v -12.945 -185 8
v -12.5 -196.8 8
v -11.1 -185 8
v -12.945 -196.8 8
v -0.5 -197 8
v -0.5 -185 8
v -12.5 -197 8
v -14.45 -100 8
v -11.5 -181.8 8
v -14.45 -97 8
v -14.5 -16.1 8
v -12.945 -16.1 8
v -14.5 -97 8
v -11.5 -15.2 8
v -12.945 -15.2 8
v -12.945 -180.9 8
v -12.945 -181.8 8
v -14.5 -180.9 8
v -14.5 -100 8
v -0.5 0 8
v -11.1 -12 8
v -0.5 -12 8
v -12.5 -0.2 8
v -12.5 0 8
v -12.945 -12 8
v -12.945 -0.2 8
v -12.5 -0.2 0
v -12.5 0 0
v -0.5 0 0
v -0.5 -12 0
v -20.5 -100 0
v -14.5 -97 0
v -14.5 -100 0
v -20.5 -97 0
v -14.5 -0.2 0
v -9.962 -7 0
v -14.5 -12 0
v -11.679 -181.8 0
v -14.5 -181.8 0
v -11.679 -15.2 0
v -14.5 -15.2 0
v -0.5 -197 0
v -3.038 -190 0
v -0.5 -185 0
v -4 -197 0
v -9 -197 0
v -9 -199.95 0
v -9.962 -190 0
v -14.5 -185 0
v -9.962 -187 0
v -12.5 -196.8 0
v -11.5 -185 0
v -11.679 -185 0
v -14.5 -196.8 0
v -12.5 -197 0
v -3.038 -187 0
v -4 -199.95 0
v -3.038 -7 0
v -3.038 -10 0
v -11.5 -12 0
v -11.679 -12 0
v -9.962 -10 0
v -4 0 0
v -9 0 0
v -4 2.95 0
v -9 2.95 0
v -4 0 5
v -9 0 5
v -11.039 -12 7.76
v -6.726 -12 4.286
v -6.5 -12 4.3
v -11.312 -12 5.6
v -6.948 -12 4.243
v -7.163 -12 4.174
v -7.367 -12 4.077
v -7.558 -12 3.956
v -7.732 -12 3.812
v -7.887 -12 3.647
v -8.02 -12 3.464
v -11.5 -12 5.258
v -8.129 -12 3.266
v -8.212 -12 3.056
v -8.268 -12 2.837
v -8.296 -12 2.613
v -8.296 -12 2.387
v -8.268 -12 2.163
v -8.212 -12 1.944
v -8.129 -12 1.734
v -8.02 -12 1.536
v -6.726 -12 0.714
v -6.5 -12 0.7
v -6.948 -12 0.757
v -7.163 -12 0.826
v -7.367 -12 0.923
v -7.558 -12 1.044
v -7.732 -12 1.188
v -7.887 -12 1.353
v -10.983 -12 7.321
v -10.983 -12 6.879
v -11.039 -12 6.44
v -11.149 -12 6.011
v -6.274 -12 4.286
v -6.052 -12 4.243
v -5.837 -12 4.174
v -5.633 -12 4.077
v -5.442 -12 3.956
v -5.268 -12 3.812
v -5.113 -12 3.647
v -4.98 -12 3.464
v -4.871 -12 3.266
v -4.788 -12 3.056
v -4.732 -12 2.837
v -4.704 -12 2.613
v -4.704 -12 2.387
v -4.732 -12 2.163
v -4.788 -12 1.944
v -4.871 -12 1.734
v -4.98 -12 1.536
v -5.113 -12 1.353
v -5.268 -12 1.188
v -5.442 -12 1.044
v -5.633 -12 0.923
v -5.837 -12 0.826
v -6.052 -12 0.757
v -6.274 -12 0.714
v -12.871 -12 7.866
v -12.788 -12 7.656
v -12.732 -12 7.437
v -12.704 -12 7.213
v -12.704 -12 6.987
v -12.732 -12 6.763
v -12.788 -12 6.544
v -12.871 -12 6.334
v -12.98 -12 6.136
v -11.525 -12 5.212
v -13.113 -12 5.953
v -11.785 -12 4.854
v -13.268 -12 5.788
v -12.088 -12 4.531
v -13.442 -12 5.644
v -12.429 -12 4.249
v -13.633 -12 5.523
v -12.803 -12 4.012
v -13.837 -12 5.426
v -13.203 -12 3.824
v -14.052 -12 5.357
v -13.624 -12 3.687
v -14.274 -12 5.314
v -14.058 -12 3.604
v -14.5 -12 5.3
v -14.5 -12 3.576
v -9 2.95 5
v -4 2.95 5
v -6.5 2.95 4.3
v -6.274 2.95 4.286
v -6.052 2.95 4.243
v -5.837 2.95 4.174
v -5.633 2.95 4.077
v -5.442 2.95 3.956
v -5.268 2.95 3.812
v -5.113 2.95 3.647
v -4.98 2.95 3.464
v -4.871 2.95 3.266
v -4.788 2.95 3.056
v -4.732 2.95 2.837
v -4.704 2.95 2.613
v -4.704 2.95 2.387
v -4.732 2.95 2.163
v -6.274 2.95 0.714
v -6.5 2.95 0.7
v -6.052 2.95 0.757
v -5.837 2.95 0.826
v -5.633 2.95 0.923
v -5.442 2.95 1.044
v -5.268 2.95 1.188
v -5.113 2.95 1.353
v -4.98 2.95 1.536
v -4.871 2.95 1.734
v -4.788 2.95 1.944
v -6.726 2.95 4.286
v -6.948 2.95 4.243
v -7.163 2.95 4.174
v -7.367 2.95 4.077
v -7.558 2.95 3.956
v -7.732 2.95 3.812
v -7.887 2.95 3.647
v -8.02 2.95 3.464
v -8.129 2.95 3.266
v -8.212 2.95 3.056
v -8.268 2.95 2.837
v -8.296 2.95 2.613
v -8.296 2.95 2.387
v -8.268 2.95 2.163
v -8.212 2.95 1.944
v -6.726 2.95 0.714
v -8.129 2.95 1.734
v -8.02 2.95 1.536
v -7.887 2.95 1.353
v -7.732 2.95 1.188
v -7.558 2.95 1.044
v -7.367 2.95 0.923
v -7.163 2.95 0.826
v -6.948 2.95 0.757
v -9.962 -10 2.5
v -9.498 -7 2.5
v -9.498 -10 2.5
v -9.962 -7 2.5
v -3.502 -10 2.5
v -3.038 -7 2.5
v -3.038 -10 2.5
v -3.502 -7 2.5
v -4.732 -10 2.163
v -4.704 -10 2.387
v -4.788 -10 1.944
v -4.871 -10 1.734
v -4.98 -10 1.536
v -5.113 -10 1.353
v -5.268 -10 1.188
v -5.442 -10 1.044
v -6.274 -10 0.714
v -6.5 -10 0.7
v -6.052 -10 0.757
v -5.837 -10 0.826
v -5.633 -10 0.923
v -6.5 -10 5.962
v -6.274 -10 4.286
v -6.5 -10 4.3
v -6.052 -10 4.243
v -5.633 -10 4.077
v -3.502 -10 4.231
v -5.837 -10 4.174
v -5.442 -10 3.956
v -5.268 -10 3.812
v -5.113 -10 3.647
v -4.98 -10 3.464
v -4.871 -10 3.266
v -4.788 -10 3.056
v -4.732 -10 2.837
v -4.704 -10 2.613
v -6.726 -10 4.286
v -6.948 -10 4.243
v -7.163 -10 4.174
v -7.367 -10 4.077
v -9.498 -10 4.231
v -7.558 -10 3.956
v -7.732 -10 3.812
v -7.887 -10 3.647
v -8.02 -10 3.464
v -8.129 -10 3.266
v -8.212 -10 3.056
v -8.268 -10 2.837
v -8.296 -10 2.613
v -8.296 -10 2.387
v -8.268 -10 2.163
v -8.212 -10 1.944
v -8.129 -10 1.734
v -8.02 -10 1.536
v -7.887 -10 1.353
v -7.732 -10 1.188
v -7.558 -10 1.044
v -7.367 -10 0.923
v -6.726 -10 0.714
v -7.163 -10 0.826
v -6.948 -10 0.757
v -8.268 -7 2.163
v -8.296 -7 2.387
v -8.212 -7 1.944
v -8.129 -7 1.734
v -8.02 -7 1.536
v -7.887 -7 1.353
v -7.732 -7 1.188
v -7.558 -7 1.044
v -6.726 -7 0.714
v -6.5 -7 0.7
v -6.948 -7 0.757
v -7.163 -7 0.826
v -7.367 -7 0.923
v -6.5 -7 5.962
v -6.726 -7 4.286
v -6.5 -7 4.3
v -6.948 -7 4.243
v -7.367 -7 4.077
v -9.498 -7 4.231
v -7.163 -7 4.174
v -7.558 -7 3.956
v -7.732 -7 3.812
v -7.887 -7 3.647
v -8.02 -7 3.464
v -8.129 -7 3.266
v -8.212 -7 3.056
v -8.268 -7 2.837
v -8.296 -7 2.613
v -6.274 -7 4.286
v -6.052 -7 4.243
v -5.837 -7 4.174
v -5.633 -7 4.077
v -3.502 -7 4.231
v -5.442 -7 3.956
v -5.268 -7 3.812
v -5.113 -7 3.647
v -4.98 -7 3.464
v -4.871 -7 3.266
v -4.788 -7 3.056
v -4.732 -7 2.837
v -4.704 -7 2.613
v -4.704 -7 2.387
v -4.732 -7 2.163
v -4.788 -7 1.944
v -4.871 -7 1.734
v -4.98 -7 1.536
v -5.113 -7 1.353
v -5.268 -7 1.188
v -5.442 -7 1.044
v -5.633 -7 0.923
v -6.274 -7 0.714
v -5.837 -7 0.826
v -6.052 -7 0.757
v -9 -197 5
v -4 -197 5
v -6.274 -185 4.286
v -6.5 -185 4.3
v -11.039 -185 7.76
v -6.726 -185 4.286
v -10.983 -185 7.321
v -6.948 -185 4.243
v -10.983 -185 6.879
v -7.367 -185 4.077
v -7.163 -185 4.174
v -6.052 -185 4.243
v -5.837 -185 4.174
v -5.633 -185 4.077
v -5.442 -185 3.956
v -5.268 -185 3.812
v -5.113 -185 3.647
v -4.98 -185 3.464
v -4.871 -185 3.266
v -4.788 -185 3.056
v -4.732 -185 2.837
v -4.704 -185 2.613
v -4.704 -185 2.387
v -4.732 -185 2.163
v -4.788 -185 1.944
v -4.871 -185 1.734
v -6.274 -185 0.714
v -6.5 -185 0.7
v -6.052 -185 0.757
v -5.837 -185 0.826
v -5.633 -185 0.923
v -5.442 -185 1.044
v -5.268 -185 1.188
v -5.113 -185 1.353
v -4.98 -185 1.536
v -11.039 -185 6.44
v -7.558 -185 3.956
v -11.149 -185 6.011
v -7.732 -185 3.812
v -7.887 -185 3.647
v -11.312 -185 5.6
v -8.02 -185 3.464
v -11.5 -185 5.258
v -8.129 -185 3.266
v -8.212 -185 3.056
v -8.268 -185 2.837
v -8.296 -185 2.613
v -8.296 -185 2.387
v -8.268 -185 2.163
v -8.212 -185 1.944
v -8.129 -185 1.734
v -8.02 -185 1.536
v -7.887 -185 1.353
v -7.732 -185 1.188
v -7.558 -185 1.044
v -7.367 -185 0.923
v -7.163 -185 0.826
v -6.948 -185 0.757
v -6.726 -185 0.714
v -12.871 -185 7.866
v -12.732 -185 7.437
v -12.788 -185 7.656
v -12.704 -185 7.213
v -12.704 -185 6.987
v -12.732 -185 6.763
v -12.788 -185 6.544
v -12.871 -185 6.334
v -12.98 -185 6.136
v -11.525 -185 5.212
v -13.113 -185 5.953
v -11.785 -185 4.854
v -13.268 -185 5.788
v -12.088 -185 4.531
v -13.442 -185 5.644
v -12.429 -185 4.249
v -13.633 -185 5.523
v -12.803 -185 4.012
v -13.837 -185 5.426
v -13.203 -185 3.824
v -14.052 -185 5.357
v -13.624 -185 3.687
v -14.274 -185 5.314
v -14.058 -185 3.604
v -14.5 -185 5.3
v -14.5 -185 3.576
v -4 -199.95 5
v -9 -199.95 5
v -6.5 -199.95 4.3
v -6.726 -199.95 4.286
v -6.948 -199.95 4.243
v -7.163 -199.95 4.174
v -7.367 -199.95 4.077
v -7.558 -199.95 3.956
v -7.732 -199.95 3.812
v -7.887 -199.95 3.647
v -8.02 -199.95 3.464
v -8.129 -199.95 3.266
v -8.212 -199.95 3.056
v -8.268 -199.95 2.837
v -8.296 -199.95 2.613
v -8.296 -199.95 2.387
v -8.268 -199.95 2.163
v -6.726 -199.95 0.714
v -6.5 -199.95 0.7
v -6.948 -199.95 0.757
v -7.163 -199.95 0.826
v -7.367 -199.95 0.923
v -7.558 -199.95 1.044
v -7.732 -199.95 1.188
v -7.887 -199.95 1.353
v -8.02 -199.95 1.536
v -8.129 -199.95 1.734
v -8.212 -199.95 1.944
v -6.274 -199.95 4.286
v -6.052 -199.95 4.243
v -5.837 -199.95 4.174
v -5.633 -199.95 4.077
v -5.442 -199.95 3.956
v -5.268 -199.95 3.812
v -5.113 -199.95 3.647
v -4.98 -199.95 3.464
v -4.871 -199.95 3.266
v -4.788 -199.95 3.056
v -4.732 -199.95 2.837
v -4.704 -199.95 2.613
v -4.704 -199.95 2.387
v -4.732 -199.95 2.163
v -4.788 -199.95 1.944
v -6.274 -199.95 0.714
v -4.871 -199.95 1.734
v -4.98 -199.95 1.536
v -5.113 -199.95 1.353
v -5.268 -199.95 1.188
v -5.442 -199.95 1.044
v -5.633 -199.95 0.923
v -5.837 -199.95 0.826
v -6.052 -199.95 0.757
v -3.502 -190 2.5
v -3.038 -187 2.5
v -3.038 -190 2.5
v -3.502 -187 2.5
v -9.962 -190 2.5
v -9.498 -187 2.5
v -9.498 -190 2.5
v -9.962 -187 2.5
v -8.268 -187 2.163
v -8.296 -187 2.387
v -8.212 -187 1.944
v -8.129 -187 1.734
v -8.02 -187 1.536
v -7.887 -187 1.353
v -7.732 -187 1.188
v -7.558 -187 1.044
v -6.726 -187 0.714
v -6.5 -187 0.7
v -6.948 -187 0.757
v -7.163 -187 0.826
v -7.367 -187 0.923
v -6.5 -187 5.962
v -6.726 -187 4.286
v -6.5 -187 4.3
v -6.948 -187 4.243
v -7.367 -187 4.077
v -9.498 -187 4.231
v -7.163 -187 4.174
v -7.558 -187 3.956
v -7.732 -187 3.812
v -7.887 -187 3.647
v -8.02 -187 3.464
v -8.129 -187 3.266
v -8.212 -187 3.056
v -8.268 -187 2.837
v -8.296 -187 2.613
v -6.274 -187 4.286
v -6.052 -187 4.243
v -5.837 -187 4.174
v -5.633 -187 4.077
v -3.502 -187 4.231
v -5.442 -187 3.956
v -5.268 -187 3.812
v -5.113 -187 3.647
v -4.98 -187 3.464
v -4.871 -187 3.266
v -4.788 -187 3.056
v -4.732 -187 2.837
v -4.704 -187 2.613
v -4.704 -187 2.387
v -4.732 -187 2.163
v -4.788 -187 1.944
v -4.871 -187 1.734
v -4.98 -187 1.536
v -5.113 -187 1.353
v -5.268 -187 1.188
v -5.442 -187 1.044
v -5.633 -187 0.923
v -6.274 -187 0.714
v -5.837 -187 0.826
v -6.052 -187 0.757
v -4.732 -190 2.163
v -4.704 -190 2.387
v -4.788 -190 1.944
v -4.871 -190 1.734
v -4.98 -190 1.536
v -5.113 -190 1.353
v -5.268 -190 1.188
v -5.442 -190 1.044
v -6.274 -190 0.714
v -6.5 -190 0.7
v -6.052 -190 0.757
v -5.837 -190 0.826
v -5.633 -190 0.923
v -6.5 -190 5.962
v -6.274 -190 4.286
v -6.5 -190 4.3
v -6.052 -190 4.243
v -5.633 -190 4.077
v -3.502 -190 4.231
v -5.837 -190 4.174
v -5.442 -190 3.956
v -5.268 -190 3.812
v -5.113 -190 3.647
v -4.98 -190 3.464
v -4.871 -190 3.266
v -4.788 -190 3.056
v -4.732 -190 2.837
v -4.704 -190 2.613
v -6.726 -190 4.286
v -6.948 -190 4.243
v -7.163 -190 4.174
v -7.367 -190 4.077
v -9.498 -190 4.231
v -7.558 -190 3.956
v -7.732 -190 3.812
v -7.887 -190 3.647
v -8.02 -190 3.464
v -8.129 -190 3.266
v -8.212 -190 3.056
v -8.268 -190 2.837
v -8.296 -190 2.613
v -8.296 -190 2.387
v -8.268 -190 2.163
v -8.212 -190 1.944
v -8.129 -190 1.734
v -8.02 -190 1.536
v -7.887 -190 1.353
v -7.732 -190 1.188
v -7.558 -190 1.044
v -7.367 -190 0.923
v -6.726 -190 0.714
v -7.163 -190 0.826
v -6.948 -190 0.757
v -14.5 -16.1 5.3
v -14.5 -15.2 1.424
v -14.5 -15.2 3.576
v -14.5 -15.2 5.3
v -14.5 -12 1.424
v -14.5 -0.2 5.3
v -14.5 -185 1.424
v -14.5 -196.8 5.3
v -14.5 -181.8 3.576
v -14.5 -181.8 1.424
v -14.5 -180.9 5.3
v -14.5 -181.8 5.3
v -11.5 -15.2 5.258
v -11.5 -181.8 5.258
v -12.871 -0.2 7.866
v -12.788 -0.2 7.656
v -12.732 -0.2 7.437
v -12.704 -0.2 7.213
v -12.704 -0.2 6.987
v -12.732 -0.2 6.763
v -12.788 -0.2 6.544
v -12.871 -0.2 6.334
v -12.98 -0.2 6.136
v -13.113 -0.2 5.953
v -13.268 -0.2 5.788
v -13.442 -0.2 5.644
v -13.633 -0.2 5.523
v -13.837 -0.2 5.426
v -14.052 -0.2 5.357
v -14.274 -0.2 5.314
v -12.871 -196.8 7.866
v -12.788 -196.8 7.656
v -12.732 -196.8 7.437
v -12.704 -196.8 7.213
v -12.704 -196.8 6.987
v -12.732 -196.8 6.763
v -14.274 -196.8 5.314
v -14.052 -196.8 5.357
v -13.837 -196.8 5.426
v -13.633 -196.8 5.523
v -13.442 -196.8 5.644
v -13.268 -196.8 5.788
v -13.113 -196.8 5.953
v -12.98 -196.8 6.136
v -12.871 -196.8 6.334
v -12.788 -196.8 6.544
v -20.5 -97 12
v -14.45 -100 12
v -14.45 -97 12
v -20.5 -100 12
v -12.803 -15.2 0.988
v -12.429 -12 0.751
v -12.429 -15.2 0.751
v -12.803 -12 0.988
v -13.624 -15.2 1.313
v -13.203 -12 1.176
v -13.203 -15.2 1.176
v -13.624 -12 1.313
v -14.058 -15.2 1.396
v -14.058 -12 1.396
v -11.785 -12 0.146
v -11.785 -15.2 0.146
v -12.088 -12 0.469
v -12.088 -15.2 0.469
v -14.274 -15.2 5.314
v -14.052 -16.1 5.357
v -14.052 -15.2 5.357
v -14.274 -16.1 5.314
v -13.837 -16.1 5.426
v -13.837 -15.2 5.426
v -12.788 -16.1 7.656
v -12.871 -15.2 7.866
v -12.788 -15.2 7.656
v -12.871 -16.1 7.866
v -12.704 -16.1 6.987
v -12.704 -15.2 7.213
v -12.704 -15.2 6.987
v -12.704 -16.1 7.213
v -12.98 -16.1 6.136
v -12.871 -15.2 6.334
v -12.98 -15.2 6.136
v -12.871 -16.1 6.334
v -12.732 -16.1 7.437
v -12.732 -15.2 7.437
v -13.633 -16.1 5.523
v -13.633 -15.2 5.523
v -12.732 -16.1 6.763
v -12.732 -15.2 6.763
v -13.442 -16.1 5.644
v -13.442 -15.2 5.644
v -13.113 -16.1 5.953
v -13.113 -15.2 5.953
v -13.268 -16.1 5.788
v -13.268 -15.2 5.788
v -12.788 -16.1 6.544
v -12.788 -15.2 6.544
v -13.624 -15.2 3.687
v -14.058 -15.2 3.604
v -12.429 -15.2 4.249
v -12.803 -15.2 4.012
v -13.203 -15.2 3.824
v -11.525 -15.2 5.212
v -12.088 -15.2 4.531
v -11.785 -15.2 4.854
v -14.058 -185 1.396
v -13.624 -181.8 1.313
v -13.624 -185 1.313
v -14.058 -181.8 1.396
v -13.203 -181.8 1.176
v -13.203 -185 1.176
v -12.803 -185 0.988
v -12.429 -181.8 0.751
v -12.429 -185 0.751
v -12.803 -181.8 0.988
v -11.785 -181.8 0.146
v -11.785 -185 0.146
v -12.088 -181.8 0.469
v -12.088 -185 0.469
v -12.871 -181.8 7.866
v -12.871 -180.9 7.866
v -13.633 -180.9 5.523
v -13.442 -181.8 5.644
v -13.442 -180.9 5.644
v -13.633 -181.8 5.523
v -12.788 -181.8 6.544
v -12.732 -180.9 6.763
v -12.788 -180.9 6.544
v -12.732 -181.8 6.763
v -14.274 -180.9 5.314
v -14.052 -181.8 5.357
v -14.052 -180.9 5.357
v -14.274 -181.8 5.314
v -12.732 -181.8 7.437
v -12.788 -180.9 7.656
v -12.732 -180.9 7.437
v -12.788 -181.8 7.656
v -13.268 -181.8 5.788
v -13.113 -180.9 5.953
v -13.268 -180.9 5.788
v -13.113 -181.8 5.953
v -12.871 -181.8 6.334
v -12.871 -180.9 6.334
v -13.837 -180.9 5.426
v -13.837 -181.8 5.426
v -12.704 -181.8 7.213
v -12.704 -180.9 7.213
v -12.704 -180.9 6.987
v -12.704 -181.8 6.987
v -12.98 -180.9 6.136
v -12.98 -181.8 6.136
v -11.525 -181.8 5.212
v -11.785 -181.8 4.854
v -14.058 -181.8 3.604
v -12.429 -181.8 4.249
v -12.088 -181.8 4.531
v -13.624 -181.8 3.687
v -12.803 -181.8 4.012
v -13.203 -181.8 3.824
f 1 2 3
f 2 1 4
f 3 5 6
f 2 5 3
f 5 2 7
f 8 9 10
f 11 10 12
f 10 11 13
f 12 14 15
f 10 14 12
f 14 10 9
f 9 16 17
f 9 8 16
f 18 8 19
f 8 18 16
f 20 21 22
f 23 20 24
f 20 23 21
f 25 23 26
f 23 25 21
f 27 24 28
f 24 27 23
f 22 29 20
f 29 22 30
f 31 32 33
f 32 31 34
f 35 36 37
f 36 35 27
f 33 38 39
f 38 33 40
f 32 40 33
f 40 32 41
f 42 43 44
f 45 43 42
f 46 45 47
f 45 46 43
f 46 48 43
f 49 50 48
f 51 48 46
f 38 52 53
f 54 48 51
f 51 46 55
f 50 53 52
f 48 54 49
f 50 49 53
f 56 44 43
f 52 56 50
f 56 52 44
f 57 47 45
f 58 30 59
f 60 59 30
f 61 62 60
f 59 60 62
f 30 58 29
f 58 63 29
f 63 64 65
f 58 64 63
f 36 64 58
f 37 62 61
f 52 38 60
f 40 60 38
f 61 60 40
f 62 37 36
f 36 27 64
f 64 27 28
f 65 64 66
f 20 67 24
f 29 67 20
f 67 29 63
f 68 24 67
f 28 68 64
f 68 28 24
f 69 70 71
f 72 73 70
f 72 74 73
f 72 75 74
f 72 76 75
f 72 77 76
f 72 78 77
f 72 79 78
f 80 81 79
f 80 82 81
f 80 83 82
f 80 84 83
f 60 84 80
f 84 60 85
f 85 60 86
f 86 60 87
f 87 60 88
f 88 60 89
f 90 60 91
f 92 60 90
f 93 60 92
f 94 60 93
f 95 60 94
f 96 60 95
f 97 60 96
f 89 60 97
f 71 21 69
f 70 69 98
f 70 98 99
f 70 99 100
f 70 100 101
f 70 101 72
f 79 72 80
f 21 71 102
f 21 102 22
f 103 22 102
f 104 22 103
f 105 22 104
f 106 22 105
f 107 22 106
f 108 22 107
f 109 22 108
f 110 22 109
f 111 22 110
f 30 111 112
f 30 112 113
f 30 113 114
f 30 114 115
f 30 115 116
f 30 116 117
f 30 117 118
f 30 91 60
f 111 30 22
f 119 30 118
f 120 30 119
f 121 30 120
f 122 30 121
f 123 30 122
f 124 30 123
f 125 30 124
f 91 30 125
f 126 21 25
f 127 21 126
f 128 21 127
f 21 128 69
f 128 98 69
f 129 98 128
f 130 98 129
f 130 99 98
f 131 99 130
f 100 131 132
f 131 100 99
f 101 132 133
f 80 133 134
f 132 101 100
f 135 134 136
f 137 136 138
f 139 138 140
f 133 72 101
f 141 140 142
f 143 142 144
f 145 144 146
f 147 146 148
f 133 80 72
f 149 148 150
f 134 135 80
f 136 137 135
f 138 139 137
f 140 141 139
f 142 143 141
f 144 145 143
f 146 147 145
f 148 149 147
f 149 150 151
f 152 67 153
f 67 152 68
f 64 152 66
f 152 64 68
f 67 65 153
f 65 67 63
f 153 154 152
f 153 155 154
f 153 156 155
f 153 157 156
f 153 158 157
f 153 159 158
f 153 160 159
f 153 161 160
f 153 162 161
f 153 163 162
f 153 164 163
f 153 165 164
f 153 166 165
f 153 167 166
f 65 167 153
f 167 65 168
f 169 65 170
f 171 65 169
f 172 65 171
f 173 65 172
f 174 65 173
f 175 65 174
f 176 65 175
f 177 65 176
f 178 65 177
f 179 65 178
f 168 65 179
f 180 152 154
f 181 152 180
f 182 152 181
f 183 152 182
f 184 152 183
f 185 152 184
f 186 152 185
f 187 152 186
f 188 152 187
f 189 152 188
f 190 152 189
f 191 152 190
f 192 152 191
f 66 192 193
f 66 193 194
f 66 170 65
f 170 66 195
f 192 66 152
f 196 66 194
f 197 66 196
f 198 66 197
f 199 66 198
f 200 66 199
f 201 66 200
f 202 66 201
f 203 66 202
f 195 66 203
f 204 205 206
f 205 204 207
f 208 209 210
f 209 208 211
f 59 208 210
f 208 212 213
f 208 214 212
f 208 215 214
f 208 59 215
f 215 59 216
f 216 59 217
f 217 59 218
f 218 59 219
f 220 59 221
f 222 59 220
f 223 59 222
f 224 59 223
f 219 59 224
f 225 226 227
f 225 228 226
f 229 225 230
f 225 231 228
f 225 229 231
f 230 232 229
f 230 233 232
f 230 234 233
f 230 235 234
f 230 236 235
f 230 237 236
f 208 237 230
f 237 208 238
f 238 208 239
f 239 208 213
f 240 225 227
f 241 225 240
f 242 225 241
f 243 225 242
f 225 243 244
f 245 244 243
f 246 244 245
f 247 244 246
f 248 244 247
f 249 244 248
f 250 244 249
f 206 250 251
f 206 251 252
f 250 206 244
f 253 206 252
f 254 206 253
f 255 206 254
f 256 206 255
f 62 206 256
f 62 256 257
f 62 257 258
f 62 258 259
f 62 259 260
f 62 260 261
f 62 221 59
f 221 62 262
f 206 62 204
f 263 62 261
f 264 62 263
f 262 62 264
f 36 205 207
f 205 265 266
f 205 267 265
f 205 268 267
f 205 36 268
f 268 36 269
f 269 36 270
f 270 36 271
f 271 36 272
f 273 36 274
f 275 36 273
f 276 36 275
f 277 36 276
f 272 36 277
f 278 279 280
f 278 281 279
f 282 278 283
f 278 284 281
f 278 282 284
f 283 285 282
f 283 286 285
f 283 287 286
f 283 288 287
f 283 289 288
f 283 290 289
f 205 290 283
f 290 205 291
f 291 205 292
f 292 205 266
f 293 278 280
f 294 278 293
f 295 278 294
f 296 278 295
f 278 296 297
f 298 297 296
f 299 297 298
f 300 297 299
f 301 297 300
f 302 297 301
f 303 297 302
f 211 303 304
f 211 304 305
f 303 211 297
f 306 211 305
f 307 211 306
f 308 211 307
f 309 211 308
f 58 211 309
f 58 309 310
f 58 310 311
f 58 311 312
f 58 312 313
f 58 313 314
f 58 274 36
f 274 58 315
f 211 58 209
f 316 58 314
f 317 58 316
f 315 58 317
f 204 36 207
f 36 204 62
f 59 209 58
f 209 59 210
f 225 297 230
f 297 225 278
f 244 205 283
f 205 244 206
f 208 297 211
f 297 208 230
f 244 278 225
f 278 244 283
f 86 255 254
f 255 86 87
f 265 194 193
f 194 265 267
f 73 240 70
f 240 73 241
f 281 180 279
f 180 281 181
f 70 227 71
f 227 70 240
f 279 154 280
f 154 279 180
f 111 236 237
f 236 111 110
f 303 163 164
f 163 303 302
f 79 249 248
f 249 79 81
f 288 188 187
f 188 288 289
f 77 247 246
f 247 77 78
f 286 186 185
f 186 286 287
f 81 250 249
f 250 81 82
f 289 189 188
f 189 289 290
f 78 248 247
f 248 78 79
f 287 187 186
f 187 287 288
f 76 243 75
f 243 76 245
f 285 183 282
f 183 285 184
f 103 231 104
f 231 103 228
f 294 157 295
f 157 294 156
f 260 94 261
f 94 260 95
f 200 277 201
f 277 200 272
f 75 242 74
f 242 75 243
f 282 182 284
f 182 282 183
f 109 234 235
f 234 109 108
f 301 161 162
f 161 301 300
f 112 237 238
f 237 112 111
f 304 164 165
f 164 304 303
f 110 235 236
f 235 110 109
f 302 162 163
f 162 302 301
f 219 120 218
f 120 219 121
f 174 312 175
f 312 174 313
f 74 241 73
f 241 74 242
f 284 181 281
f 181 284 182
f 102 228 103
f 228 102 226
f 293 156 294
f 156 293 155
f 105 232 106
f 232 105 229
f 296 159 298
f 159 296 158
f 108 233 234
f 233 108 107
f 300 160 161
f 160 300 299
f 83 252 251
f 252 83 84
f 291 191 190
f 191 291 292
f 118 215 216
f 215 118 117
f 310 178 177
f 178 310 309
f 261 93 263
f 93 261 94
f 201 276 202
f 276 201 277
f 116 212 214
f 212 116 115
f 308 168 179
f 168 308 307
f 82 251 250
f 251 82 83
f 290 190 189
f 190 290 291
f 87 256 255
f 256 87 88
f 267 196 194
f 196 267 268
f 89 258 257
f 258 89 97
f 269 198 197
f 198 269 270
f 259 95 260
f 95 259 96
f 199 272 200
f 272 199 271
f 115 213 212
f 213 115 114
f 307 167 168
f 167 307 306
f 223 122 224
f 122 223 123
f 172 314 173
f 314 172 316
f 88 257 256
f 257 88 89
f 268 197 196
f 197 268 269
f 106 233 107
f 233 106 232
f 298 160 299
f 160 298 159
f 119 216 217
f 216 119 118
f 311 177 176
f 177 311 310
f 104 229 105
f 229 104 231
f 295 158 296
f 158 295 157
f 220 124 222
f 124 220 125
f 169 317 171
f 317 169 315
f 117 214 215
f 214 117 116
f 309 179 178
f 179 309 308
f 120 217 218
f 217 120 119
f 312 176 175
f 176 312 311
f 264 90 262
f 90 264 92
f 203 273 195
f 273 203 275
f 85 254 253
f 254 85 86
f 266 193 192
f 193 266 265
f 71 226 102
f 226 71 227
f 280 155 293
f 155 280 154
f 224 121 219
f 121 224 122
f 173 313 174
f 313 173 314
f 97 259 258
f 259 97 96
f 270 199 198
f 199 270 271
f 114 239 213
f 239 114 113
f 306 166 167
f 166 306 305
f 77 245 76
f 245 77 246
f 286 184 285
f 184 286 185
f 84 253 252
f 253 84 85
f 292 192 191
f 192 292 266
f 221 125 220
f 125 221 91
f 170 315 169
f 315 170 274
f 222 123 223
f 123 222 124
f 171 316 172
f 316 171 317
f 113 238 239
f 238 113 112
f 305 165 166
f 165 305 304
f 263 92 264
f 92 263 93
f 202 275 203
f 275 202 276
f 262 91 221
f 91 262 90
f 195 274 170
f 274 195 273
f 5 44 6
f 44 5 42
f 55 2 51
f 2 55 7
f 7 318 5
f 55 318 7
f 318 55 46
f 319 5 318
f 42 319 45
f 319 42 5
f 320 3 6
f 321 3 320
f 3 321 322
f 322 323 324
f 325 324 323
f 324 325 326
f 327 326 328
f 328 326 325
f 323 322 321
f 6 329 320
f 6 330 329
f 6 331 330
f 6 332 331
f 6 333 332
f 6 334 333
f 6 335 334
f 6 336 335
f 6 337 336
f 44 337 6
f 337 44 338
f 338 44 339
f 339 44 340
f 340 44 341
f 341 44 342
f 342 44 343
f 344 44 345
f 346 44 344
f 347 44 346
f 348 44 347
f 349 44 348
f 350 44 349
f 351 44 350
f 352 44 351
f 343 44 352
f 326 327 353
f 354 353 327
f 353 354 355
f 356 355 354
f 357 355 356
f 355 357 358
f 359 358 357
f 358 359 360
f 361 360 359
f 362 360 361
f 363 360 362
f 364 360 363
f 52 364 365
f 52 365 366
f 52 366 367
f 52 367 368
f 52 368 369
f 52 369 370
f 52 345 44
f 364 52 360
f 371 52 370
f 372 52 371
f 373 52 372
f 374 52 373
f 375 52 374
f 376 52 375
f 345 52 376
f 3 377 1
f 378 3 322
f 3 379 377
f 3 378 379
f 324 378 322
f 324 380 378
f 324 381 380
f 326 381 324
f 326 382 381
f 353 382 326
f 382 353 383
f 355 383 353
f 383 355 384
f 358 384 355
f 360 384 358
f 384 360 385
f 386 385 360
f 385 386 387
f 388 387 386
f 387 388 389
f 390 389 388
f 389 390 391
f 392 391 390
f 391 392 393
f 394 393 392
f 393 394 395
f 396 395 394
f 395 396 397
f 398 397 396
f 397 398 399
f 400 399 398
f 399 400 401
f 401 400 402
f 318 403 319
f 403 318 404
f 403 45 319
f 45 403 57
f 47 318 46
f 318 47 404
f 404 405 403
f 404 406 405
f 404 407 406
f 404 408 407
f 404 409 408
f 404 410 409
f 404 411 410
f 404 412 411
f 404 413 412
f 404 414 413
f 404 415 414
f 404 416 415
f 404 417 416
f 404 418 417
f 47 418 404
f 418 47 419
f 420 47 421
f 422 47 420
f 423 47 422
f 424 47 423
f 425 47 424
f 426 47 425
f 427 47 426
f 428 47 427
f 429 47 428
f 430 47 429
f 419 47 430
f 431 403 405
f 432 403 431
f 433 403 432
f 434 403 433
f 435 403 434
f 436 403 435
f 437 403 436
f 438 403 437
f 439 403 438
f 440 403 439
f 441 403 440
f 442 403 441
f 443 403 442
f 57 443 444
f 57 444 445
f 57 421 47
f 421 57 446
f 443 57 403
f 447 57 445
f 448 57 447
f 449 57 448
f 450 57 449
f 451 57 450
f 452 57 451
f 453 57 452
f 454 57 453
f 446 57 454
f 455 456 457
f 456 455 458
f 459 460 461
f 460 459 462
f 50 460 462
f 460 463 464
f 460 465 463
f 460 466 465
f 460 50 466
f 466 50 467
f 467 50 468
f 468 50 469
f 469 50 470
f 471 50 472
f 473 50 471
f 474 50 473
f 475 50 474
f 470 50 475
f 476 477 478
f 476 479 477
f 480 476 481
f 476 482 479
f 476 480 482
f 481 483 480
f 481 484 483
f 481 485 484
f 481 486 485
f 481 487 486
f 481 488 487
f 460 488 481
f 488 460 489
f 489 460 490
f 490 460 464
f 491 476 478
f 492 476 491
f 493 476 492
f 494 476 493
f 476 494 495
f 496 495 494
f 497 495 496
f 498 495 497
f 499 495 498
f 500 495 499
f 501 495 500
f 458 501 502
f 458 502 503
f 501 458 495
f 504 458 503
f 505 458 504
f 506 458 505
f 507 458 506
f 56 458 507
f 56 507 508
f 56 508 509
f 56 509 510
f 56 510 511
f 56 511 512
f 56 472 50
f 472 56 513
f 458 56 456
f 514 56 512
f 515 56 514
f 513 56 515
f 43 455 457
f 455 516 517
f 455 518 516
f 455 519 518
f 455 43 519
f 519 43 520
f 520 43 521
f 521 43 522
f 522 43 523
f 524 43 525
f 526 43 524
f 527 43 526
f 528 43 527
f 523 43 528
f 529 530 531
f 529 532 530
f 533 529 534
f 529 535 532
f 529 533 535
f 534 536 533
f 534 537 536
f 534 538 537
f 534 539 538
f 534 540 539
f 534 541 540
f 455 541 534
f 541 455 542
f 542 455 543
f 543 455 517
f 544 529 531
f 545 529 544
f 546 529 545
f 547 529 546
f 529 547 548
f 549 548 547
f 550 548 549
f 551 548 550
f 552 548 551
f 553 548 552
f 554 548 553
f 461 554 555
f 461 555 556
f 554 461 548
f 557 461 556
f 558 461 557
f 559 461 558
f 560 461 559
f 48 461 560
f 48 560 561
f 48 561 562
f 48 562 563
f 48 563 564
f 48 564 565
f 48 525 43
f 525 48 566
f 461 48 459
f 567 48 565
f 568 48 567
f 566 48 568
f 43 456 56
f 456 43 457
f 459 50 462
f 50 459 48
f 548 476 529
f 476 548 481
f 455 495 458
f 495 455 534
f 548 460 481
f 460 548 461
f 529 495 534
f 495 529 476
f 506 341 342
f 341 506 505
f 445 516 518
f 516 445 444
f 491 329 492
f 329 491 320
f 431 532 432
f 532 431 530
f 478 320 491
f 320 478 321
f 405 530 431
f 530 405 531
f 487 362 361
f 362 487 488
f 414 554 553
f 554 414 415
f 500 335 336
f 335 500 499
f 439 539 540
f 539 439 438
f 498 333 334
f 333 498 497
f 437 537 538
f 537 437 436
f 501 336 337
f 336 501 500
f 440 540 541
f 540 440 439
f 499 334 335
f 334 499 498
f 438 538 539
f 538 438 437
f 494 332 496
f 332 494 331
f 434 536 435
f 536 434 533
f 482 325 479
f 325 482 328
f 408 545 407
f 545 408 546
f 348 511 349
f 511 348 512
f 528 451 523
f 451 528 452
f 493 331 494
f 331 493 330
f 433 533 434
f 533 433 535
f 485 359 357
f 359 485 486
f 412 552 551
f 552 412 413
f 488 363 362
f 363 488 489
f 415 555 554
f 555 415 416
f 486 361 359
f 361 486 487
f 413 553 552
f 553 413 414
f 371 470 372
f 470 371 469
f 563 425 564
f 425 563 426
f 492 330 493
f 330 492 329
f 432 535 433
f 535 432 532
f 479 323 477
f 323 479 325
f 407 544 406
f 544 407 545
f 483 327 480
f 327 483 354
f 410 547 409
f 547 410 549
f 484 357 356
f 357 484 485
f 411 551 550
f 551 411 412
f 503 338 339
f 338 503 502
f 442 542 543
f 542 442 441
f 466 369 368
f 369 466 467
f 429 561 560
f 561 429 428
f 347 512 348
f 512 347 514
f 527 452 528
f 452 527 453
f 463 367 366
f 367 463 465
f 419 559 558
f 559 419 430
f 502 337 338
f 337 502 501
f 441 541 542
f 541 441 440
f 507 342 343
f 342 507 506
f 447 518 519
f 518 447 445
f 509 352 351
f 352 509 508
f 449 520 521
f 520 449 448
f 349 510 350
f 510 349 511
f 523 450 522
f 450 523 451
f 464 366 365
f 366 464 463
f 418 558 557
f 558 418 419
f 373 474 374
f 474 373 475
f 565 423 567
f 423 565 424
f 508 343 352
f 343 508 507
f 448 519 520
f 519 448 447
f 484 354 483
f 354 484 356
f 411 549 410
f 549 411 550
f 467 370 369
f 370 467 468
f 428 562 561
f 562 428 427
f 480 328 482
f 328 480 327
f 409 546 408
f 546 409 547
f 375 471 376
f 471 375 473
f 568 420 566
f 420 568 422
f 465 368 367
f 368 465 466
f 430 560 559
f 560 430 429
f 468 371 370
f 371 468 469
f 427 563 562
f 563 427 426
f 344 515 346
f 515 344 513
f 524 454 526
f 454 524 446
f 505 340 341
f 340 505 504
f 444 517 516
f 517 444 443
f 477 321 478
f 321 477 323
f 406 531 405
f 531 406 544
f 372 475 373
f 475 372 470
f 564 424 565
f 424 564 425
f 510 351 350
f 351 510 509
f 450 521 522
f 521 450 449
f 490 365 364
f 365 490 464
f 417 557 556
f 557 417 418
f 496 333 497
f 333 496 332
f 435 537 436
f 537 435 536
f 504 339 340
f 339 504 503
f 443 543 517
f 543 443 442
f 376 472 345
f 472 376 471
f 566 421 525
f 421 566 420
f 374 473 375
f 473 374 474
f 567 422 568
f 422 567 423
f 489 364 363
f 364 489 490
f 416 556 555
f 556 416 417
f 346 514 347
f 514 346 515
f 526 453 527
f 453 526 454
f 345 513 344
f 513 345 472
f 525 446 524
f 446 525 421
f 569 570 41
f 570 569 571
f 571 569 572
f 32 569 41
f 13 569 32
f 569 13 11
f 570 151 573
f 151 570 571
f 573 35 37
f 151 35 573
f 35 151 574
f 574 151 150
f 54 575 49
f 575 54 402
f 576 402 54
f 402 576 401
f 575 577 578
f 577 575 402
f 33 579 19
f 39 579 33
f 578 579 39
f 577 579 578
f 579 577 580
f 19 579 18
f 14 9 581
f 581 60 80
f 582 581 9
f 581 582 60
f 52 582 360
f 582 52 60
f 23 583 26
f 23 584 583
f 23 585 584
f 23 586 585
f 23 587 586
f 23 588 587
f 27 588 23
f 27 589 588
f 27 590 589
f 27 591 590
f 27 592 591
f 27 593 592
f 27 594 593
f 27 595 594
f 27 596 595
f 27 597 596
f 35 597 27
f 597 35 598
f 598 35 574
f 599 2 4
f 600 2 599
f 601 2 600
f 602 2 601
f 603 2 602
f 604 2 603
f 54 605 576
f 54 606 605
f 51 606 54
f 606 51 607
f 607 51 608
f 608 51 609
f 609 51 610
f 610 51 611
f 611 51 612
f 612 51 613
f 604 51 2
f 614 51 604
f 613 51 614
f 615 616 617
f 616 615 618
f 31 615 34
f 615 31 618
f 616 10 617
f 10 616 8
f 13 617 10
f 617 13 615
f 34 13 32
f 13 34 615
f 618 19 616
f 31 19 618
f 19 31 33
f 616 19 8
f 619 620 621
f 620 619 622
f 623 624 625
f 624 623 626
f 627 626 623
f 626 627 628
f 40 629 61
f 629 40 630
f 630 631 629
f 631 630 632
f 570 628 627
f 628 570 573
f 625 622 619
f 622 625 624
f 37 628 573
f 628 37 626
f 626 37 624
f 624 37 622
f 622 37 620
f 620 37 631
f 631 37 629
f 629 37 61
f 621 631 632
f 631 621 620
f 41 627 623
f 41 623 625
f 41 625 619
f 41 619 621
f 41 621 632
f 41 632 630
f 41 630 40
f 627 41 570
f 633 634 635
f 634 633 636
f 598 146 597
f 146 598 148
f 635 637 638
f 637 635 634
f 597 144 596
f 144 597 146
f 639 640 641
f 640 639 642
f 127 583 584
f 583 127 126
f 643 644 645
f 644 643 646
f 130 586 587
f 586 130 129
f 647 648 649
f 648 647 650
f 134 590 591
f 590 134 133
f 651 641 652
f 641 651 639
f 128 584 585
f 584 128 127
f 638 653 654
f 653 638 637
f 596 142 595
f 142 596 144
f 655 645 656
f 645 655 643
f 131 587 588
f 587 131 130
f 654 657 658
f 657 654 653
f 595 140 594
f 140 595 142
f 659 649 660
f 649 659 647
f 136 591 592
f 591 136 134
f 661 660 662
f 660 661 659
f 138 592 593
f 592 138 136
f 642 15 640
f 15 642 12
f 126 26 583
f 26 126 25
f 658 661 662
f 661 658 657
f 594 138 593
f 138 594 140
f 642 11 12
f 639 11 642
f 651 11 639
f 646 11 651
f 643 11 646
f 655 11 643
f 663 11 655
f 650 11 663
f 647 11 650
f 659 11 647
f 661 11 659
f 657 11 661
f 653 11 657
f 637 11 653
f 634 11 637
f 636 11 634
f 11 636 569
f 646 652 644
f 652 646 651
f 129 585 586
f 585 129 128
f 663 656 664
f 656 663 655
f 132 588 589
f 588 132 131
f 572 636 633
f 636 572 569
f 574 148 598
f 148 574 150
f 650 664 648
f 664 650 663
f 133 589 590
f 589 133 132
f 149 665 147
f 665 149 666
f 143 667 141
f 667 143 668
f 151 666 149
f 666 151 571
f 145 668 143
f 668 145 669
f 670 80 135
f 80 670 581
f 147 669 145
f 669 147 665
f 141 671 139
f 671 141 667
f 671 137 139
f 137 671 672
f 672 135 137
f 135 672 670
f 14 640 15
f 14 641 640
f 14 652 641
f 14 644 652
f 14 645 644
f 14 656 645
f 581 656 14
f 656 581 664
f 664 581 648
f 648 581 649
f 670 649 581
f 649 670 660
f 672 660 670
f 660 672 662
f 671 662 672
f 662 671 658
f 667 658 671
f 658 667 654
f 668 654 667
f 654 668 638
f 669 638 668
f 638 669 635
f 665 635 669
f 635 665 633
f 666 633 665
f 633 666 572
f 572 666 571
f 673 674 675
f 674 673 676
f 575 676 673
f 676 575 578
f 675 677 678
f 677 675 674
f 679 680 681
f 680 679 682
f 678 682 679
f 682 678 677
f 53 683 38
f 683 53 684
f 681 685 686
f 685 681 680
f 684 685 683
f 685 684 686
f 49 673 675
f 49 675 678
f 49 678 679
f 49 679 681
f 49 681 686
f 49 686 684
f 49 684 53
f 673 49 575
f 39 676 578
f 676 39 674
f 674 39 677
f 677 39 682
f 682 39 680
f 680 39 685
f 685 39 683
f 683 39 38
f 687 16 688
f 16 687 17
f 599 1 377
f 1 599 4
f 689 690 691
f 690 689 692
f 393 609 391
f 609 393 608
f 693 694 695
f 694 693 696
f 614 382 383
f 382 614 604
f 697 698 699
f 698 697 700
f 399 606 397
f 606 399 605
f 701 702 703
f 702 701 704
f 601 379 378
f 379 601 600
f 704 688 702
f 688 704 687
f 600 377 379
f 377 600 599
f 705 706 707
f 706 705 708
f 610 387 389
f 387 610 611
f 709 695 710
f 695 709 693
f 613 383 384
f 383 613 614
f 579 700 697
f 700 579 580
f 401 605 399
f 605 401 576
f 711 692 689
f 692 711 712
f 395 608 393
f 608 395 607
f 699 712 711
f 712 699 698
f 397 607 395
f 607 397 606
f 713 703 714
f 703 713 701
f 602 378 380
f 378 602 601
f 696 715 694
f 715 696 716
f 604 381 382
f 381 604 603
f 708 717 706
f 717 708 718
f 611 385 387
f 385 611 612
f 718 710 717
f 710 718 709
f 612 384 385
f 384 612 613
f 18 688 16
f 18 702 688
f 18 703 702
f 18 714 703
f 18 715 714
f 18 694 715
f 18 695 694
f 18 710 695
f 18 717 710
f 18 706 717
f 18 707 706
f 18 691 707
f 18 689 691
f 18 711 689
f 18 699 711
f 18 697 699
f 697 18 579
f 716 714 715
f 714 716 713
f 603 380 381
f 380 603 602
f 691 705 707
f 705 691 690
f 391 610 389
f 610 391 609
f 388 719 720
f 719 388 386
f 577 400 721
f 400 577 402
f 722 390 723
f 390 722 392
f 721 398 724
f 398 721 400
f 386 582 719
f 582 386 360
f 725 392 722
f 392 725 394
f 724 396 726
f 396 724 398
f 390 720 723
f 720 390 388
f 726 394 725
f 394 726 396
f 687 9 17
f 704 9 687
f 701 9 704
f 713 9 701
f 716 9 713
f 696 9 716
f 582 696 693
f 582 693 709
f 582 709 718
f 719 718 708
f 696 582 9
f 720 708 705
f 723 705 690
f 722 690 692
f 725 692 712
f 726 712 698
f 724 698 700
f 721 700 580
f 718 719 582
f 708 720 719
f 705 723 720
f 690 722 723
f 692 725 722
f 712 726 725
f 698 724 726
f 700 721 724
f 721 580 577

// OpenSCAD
$fn = 50;

difference() {
	union() {
		translate(v = [0, 0, 0]) {
			rotate(a = [0, 0, 0]) {
				difference() {
					union() {
						translate(v = [0, 0, 2.5]) {
							rotate(a = [0, -90, 0]) {
								difference() {
									union() {
										translate(v = [0, 0, 0]) {
											rotate(a = [0, 0, 0]) {
												difference() {
													union() {
														translate(v = [-2.5, -12.0, 0.5]) {
															cube(size = [8.0, 12.0, 12.0]);
														}
														translate(v = [-2.5, -0.05, 4.0]) {
															cube(size = [5.0, 3.0, 5.0]);
														}
													}
													union() {
														translate(v = [0, -7.0, 6.5]) {
															rotate(a = [90, 0, 0]) {
																difference() {
																	union() {
																		translate(v = [-20.0, -3.4619999999999997, 0]) {
																			cube(size = [20, 6.9239999999999995, 3]);
																		}
																		linear_extrude(height = 3) {
																			polygon(points = [[3.4619999999999997, 0.0], [1.7310000000000003, 2.9981799479017264], [-1.7309999999999992, 2.9981799479017264], [-3.4619999999999997, 4.2397272186481365e-16], [-1.7310000000000014, -2.998179947901726], [1.7309999999999977, -2.9981799479017277]]);
																		}
																	}
																	union();
																}
															}
														}
														translate(v = [0, 3.0500000000000003, 6.5]) {
															rotate(a = [90, 0, 0]) {
																cylinder(h = 22.95, r = 1.8);
															}
														}
													}
												}
											}
										}
										translate(v = [0, -197.0, 13.0]) {
											rotate(a = [180, 0, 0]) {
												difference() {
													union() {
														translate(v = [-2.5, -12.0, 0.5]) {
															cube(size = [8.0, 12.0, 12.0]);
														}
														translate(v = [-2.5, -0.05, 4.0]) {
															cube(size = [5.0, 3.0, 5.0]);
														}
													}
													union() {
														translate(v = [0, -7.0, 6.5]) {
															rotate(a = [90, 0, 0]) {
																difference() {
																	union() {
																		translate(v = [-20.0, -3.4619999999999997, 0]) {
																			cube(size = [20, 6.9239999999999995, 3]);
																		}
																		linear_extrude(height = 3) {
																			polygon(points = [[3.4619999999999997, 0.0], [1.7310000000000003, 2.9981799479017264], [-1.7309999999999992, 2.9981799479017264], [-3.4619999999999997, 4.2397272186481365e-16], [-1.7310000000000014, -2.998179947901726], [1.7309999999999977, -2.9981799479017277]]);
																		}
																	}
																	union();
																}
															}
														}
														translate(v = [0, 3.0500000000000003, 6.5]) {
															rotate(a = [90, 0, 0]) {
																cylinder(h = 22.95, r = 1.8);
															}
														}
													}
												}
											}
										}
										translate(v = [-2.5, -196.8, 11.5]) {
											cube(size = [8.0, 196.6, 3.0]);
										}
										translate(v = [-2.5, -100.0, 14.45]) {
											cube(size = [12.0, 3.0, 6.05]);
										}
									}
									union() {
										translate(v = [-4.600000000500003, 0.1, 14.5]) {
											rotate(a = [90, 0, 0]) {
												cylinder(h = 16.2, r = 1.8);
											}
										}
										translate(v = [-4.600000000500003, -12.0, 14.5]) {
											rotate(a = [90, 0, 0]) {
												cylinder(h = 3.2, r = 3.5235);
											}
										}
										translate(v = [4.600000000500003, 0.1, 14.5]) {
											rotate(a = [90, 0, 0]) {
												cylinder(h = 16.2, r = 1.8);
											}
										}
										translate(v = [4.600000000500003, -12.0, 14.5]) {
											rotate(a = [90, 0, 0]) {
												cylinder(h = 3.2, r = 3.5235);
											}
										}
										translate(v = [-4.600000000500003, -197.1, 14.5]) {
											rotate(a = [-90, 0, 0]) {
												cylinder(h = 16.2, r = 1.8);
											}
										}
										translate(v = [-4.600000000500003, -185.0, 14.5]) {
											rotate(a = [-90, 0, 0]) {
												cylinder(h = 3.2, r = 3.5235);
											}
										}
										translate(v = [4.600000000500003, -197.1, 14.5]) {
											rotate(a = [-90, 0, 0]) {
												cylinder(h = 16.2, r = 1.8);
											}
										}
										translate(v = [4.600000000500003, -185.0, 14.5]) {
											rotate(a = [-90, 0, 0]) {
												cylinder(h = 3.2, r = 3.5235);
											}
										}
									}
								}
							}
						}
					}
					union();
				}
			}
		}
	}
	union();
}
